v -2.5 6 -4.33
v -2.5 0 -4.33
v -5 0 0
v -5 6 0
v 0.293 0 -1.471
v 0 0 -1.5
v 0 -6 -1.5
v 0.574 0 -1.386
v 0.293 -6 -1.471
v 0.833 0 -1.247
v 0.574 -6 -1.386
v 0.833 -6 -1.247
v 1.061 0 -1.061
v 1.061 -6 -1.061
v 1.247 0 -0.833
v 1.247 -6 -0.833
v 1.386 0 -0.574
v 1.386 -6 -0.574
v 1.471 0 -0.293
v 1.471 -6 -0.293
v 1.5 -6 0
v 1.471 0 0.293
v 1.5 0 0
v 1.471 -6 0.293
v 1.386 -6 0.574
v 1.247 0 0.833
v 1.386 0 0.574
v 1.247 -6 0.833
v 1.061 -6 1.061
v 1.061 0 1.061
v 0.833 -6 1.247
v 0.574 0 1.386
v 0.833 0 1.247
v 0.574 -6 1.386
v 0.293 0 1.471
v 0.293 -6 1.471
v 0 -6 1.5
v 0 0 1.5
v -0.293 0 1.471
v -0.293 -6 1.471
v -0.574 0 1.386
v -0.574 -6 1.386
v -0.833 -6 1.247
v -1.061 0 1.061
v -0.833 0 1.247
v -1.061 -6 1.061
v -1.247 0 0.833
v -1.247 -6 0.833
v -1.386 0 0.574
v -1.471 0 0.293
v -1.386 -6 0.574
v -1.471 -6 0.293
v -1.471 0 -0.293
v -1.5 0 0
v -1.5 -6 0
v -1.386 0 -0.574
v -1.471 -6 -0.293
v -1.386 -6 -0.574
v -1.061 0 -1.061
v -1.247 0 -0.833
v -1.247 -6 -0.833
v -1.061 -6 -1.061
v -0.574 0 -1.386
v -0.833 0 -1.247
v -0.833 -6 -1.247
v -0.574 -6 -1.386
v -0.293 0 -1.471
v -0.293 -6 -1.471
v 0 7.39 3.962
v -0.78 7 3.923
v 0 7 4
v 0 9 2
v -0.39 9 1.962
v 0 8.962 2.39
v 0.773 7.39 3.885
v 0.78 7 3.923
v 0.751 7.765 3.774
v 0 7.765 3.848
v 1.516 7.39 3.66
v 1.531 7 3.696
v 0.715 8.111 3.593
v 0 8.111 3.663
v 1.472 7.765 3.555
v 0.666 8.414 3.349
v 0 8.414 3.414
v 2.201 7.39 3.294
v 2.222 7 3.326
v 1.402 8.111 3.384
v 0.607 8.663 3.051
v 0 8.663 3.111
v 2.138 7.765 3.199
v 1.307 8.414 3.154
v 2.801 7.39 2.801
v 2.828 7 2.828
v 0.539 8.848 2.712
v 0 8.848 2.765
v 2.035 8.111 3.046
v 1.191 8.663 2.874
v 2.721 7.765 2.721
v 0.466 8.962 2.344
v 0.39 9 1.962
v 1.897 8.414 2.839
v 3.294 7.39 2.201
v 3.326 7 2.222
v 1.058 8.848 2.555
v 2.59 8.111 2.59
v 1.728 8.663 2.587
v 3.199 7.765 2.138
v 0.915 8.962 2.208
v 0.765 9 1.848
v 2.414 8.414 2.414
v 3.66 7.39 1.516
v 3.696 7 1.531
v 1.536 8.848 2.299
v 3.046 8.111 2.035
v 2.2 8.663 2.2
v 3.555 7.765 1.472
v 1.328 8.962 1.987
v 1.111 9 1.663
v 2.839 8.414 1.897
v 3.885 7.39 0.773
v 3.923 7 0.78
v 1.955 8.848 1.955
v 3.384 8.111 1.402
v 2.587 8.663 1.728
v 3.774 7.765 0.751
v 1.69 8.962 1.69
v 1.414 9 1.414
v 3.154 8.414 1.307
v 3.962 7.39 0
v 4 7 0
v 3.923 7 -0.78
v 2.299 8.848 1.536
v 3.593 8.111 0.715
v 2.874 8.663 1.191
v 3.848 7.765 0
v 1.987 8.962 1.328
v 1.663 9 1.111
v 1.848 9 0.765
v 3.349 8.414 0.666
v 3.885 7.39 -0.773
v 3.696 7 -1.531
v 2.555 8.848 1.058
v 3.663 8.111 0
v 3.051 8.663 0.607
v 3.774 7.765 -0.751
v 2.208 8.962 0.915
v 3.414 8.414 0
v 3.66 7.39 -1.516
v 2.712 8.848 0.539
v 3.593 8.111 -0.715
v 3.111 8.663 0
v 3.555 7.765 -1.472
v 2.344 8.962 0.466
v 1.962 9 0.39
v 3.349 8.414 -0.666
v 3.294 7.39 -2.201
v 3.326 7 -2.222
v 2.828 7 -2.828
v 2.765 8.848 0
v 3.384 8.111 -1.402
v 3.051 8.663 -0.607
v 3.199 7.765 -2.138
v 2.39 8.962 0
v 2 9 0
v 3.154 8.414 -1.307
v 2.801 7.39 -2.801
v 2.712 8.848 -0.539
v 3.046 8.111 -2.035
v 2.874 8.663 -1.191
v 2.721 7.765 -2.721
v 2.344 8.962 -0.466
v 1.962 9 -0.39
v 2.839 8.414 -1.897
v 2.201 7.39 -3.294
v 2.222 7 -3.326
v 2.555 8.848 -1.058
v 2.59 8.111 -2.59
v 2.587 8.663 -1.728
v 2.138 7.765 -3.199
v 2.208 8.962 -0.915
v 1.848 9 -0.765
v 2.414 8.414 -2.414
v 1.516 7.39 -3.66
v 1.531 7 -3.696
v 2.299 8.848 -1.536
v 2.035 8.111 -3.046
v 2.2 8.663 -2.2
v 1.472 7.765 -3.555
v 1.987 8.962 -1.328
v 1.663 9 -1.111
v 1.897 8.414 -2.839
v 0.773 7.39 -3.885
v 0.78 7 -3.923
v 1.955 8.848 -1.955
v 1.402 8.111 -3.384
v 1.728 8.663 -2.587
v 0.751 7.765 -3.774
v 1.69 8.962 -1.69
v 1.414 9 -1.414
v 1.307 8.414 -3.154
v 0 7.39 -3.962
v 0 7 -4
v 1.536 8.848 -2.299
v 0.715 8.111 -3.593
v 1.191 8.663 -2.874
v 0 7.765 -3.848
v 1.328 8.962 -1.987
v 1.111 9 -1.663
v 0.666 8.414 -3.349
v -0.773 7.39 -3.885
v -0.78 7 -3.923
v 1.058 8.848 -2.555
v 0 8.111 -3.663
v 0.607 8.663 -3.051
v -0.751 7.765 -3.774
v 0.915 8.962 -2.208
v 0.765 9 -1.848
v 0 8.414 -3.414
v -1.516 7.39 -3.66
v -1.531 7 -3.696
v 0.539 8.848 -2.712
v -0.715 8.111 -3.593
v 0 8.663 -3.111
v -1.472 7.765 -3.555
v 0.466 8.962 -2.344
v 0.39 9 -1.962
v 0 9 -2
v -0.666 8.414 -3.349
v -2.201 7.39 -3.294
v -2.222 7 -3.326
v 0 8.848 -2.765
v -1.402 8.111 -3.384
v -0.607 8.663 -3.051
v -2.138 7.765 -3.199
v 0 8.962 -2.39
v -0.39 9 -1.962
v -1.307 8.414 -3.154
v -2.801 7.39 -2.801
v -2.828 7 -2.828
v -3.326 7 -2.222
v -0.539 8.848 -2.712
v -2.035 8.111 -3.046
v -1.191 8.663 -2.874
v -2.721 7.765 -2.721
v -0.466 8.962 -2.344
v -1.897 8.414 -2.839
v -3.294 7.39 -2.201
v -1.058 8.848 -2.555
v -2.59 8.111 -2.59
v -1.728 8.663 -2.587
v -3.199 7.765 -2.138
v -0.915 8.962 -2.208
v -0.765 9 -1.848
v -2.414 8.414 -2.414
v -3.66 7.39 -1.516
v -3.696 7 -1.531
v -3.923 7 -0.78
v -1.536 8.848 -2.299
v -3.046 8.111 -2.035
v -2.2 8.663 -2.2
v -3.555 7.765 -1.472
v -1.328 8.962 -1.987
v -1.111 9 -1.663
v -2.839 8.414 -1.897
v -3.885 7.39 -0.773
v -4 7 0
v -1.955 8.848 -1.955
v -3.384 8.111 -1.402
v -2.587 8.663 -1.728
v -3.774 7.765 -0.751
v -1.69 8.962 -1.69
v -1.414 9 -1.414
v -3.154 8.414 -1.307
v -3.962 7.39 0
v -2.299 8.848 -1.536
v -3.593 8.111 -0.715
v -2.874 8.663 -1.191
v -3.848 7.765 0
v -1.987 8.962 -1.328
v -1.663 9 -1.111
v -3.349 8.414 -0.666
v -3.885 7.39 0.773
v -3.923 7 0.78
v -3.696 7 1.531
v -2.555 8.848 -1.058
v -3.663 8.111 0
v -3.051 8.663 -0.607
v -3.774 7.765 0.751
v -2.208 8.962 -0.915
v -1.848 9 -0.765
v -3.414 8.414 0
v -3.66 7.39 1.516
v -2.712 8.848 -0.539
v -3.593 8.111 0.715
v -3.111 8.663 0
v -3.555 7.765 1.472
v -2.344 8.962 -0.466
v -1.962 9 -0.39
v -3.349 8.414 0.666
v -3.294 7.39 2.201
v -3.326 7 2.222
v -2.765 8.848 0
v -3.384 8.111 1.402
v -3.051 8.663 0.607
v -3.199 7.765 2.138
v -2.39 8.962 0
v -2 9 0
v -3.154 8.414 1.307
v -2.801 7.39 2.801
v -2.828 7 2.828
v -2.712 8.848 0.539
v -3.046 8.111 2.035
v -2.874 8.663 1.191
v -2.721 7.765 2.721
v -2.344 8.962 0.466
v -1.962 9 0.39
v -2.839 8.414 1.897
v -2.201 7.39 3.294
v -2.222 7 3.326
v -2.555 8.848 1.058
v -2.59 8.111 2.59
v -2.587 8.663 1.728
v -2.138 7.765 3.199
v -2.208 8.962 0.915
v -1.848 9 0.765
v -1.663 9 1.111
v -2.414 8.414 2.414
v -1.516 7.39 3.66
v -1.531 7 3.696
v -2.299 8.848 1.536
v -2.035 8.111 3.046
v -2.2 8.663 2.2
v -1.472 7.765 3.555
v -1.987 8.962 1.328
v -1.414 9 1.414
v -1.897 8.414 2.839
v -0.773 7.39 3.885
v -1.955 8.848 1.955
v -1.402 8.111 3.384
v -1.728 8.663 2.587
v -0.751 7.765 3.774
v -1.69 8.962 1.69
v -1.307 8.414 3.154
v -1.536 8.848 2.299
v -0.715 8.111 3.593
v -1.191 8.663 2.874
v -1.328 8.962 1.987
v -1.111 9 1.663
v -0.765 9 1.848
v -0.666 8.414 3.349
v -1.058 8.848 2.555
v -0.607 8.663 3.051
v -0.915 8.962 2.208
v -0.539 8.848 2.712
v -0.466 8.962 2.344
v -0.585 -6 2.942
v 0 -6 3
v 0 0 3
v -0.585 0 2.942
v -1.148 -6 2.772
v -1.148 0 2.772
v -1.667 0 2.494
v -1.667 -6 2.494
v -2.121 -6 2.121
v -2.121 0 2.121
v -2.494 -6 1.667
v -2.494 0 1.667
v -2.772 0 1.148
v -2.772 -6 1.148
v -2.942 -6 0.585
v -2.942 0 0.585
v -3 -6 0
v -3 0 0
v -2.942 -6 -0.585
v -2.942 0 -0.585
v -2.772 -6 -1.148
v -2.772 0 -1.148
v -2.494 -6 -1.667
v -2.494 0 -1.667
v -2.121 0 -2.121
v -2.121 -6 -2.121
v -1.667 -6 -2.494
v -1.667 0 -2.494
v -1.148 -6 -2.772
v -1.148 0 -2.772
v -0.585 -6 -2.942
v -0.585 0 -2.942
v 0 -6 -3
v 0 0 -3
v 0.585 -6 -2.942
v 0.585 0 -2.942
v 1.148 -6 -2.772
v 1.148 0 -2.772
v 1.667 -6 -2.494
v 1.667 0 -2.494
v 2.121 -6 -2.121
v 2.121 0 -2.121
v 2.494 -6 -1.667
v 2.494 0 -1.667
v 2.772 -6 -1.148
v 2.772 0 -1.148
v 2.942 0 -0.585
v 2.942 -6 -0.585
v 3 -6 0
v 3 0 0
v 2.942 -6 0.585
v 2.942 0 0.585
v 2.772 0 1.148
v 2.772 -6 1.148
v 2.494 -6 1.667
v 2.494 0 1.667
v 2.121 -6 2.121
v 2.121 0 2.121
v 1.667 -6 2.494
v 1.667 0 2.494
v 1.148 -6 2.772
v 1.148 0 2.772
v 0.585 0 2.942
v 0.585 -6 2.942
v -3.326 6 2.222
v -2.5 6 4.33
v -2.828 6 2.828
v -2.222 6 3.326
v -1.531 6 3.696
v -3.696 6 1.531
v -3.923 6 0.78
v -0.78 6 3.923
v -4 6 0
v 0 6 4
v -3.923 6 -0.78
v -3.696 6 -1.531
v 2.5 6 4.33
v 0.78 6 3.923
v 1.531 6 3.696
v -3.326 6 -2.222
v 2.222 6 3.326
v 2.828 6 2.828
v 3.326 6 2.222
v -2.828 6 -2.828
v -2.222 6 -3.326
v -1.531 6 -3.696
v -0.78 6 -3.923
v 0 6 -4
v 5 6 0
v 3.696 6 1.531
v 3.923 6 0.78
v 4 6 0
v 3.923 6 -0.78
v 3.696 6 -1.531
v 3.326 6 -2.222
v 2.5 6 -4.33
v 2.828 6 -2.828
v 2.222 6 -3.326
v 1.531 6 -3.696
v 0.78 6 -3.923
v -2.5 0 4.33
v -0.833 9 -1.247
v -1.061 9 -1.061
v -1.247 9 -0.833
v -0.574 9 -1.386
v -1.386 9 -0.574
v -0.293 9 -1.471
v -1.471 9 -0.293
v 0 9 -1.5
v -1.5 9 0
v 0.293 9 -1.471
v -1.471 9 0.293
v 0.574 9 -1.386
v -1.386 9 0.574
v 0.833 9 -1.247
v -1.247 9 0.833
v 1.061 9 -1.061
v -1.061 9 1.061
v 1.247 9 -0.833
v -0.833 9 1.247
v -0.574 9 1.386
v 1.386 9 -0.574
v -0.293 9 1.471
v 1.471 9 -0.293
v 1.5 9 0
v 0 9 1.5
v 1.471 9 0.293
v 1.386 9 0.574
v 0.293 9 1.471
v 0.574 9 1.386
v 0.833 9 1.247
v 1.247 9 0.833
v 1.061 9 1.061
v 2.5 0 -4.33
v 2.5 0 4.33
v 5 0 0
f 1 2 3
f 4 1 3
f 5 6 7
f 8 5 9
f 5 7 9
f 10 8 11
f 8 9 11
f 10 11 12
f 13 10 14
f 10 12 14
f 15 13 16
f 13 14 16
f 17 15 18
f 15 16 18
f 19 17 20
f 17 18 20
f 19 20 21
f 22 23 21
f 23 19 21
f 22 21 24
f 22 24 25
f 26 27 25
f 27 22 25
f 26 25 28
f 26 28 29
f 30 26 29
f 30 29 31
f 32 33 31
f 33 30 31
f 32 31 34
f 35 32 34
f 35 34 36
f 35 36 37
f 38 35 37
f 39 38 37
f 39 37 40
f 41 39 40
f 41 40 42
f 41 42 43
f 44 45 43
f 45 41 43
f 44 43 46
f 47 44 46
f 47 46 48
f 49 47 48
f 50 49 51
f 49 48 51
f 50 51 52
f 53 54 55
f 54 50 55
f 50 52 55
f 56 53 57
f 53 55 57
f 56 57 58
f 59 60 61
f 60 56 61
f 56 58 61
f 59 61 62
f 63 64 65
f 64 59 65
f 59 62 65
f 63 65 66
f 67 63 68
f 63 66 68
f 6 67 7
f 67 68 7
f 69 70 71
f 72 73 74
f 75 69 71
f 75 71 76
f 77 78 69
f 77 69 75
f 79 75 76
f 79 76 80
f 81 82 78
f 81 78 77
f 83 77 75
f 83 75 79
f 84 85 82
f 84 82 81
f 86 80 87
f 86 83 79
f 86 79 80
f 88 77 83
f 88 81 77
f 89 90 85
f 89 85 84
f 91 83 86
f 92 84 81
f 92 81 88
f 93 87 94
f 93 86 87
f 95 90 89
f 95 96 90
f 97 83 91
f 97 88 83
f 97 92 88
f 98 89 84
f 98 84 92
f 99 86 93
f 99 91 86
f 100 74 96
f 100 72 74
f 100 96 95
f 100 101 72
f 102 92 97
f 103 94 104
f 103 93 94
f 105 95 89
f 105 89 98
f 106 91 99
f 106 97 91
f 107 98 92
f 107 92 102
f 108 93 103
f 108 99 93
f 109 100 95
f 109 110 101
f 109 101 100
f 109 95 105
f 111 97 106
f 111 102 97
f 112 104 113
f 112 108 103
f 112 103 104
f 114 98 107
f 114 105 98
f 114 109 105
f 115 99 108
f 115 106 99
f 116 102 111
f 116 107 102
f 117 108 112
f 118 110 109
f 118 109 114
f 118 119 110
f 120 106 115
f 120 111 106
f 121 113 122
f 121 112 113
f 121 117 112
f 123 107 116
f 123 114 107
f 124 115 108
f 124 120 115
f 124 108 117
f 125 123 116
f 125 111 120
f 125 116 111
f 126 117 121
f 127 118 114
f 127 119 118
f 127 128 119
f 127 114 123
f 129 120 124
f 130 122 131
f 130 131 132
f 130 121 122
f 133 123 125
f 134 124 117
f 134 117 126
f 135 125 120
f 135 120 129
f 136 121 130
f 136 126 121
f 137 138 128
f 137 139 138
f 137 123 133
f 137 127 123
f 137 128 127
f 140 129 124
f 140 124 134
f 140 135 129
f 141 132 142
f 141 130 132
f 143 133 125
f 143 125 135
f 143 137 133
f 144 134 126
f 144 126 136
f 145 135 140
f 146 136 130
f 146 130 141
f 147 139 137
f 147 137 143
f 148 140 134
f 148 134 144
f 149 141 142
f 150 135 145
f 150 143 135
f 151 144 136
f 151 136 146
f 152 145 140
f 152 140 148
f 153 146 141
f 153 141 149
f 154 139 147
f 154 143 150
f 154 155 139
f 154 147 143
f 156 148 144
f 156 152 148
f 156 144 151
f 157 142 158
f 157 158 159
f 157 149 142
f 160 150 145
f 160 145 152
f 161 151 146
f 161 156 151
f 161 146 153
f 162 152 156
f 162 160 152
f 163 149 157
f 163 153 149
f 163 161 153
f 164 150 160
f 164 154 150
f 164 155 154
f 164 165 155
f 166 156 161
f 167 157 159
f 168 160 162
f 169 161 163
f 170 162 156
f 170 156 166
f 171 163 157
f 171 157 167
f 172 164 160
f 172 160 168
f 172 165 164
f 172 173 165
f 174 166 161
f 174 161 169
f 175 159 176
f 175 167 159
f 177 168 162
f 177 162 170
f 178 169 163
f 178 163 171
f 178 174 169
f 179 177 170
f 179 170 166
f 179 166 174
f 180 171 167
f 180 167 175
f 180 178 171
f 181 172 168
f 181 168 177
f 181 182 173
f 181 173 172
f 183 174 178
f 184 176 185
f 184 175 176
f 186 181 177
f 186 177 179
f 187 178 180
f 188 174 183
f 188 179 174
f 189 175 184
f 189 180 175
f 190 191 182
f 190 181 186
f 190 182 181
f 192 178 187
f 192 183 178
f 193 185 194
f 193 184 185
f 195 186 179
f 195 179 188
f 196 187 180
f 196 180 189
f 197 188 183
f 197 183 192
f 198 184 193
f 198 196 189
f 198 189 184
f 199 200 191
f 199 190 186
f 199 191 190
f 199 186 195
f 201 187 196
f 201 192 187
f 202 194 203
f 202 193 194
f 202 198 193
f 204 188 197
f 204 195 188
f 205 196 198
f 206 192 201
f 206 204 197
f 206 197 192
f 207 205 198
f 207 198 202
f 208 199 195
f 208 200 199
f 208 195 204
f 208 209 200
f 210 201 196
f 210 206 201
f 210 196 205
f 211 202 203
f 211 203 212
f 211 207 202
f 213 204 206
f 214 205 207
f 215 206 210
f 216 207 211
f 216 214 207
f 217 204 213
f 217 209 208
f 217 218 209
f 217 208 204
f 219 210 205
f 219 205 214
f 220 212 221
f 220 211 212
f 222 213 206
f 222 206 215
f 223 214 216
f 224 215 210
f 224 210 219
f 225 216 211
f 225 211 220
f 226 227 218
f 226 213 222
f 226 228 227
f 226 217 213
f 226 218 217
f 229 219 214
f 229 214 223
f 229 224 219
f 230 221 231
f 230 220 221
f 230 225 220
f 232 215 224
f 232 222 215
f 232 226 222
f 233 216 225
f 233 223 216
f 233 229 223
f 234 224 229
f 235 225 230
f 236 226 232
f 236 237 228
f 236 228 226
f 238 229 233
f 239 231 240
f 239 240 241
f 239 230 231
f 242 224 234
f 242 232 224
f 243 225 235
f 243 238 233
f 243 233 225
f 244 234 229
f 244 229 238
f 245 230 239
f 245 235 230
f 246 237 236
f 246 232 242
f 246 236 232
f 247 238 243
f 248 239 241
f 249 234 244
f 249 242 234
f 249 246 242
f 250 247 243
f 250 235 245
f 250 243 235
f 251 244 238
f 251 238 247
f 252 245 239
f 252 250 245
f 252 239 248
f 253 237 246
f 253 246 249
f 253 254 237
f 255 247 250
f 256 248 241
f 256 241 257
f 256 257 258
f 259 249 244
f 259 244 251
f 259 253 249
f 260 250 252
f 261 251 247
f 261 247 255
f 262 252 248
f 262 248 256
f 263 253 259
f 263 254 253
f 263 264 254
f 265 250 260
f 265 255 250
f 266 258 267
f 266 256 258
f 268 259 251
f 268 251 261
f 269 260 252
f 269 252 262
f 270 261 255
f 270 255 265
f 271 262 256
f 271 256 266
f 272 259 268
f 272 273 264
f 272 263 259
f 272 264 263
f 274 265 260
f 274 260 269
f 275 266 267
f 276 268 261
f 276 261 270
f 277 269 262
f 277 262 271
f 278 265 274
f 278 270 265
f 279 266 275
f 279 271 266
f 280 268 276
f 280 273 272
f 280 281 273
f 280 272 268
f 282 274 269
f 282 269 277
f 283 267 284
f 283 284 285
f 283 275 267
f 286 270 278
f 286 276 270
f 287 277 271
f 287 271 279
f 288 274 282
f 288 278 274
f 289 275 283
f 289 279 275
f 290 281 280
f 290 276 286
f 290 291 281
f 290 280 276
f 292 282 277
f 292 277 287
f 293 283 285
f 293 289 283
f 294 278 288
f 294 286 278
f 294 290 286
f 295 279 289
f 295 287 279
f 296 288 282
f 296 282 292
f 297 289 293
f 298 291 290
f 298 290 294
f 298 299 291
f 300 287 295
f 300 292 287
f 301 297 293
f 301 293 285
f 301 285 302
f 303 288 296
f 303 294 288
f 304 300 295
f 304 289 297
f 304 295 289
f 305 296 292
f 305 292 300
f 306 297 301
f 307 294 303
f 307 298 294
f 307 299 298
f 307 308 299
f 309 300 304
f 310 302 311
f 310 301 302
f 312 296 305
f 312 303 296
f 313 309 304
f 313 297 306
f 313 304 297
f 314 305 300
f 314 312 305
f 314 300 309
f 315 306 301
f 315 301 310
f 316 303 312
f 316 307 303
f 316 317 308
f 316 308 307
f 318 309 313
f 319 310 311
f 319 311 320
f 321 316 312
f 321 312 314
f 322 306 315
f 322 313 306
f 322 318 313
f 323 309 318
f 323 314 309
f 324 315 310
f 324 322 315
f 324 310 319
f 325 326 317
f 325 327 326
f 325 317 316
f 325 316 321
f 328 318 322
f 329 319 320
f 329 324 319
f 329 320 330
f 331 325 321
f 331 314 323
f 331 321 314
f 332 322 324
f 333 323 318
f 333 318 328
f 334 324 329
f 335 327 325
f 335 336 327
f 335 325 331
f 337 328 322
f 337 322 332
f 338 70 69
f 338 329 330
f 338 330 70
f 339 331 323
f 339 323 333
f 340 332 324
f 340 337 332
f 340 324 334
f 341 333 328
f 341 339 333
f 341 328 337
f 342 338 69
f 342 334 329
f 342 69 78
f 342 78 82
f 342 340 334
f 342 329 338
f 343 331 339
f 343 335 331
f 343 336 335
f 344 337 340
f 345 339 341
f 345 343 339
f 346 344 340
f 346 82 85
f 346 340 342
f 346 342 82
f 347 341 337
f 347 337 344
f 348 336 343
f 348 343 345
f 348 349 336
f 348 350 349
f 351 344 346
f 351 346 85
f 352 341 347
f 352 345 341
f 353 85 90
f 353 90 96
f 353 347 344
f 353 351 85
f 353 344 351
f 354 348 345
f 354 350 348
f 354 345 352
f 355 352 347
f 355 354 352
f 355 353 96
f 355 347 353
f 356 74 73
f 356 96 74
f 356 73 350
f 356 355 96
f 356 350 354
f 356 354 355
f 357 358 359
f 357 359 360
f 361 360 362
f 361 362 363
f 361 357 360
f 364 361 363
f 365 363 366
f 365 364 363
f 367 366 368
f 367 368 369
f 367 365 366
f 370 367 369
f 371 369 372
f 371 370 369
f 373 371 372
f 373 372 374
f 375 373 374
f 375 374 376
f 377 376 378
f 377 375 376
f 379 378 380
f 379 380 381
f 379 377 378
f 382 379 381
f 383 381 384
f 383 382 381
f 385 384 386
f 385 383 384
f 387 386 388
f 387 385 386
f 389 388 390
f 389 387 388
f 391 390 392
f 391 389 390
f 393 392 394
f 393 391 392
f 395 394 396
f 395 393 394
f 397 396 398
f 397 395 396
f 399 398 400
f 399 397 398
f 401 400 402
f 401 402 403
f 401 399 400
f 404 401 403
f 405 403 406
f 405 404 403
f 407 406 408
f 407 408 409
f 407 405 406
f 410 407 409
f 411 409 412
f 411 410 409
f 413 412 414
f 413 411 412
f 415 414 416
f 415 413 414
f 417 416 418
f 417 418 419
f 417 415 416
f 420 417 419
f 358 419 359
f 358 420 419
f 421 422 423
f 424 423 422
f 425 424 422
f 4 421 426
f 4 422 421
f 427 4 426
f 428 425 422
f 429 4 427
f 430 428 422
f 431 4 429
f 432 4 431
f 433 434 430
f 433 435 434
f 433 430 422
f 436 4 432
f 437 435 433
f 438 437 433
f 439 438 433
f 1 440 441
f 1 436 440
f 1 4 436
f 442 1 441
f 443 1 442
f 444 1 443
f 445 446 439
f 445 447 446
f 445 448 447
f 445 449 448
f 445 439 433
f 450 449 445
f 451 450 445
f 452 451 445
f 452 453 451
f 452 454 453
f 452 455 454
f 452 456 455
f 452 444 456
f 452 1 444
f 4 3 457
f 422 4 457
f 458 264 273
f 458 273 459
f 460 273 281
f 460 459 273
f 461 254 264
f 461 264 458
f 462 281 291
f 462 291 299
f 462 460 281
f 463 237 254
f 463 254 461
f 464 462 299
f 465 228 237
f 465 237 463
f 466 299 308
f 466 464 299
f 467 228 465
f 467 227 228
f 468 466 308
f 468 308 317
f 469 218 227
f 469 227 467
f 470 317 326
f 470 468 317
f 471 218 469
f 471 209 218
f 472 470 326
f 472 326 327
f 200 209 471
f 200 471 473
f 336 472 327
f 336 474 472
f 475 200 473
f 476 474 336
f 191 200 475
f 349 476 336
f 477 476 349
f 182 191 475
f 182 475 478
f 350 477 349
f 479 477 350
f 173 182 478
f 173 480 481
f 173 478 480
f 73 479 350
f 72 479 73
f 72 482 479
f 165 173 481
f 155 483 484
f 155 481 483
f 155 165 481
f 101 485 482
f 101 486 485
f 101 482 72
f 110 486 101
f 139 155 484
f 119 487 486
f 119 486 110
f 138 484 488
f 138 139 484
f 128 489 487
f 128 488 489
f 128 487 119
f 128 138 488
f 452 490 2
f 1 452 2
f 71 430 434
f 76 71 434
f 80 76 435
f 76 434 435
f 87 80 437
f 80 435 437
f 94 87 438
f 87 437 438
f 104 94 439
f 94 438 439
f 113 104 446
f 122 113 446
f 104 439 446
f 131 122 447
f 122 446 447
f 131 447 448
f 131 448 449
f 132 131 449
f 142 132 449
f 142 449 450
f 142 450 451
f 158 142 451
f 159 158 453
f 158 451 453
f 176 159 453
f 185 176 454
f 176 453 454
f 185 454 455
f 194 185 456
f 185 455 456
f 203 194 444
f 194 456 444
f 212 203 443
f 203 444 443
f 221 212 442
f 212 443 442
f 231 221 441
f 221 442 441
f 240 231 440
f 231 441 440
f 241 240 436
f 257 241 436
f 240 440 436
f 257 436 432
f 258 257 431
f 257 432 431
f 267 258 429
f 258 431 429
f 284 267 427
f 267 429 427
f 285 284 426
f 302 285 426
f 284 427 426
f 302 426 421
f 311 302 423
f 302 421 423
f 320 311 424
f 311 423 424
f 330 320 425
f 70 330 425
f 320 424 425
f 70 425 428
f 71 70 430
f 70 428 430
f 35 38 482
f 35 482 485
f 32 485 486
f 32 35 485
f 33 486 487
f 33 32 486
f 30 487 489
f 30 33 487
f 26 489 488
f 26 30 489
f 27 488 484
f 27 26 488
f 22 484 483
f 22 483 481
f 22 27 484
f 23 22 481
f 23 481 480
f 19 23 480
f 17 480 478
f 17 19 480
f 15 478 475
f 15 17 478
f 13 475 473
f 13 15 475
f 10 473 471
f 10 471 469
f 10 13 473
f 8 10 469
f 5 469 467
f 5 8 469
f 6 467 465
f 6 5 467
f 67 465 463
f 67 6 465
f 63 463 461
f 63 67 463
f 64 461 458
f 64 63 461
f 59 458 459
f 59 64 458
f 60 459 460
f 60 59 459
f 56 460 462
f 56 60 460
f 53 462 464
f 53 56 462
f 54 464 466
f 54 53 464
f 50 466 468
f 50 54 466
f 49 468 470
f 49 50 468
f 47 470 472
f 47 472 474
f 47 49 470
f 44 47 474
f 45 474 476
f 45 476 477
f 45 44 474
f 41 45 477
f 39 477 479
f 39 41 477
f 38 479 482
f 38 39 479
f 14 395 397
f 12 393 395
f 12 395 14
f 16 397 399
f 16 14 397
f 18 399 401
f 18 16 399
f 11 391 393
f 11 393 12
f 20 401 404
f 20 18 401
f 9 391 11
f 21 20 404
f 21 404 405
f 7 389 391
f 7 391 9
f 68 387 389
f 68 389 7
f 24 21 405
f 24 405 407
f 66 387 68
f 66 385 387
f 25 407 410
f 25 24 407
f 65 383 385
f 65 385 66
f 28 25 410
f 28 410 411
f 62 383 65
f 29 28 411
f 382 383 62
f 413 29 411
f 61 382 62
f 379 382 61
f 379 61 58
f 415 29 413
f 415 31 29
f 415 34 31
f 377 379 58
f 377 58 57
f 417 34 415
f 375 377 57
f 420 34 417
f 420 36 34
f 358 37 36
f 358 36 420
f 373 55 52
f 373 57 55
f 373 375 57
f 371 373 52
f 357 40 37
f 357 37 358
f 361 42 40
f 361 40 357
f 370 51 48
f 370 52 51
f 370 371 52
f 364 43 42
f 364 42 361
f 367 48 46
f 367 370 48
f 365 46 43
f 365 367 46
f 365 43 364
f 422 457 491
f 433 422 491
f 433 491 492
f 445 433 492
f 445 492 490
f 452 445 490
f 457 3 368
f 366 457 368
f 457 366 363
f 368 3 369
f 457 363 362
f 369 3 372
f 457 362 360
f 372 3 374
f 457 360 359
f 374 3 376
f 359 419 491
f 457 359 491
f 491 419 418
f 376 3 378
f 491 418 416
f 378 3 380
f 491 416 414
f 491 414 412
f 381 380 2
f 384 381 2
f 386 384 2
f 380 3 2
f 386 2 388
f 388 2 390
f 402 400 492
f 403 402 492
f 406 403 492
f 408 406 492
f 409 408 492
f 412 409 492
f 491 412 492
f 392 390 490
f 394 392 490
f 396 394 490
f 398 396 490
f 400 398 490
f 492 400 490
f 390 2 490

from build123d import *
from build123d.topology import SkipClean

# Parameters (mm, degrees)
SKETCH2_R           = 1.5
BOSS_EXTRUDE1_DEPTH = 6
SKETCH3_R           = 4
SKETCH3_R_2         = 1.5
BOSS_EXTRUDE2_DEPTH = 3
FILLET1_R           = 2
BOSS_EXTRUDE3_START = 6
SKETCH4_R           = 3
SKETCH4_R_2         = 1.5
BOSS_EXTRUDE3_DEPTH = 6


with BuildPart() as part:
    # Sketch2 → Boss-Extrude1 (new body)
    with BuildSketch(Plane(origin=(0, 0, 0), x_dir=(1, 0, 0), z_dir=(0, 1, 0))):
        Polygon((5, 0), (2.5, 4.330127019), (-2.5, 4.330127019), (-5, 0), (-2.5, -4.330127019), (2.5, -4.330127019), align=None)
        with Locations(Location((0, 0, 0), (0, 0, 270))):
            Circle(SKETCH2_R, mode=Mode.SUBTRACT)
    extrude(amount=BOSS_EXTRUDE1_DEPTH)

    # Sketch3 → Boss-Extrude2 (add)
    with BuildSketch(Plane(origin=(0, 6, 0), x_dir=(1, 0, 0), z_dir=(0, 1, 0))):
        with Locations(Location((0, 0, 0), (0, 0, 270))):
            Circle(SKETCH3_R)
        with Locations(Location((0, 0, 0), (0, 0, 270))):
            Circle(SKETCH3_R_2, mode=Mode.SUBTRACT)
    extrude(amount=BOSS_EXTRUDE2_DEPTH)

    # Fillet1
    fillet1_edges = [part.edges().sort_by_distance(p)[0] for p in [
        (0, 9, -4),
    ]]
    fillet(fillet1_edges, radius=FILLET1_R)

    # Sketch4 → Boss-Extrude3 (add)
    with SkipClean():  # the faces are left unmerged after this step: merging them gives an invalid solid
        with BuildSketch(Plane.XZ.offset(BOSS_EXTRUDE3_START)):
            with Locations(Location((0, 0, 0), (0, 0, 90))):
                Circle(SKETCH4_R)
            with Locations(Location((0, 0, 0), (0, 0, 270))):
                Circle(SKETCH4_R_2, mode=Mode.SUBTRACT)
        extrude(amount=-BOSS_EXTRUDE3_DEPTH)


solid = part.part
